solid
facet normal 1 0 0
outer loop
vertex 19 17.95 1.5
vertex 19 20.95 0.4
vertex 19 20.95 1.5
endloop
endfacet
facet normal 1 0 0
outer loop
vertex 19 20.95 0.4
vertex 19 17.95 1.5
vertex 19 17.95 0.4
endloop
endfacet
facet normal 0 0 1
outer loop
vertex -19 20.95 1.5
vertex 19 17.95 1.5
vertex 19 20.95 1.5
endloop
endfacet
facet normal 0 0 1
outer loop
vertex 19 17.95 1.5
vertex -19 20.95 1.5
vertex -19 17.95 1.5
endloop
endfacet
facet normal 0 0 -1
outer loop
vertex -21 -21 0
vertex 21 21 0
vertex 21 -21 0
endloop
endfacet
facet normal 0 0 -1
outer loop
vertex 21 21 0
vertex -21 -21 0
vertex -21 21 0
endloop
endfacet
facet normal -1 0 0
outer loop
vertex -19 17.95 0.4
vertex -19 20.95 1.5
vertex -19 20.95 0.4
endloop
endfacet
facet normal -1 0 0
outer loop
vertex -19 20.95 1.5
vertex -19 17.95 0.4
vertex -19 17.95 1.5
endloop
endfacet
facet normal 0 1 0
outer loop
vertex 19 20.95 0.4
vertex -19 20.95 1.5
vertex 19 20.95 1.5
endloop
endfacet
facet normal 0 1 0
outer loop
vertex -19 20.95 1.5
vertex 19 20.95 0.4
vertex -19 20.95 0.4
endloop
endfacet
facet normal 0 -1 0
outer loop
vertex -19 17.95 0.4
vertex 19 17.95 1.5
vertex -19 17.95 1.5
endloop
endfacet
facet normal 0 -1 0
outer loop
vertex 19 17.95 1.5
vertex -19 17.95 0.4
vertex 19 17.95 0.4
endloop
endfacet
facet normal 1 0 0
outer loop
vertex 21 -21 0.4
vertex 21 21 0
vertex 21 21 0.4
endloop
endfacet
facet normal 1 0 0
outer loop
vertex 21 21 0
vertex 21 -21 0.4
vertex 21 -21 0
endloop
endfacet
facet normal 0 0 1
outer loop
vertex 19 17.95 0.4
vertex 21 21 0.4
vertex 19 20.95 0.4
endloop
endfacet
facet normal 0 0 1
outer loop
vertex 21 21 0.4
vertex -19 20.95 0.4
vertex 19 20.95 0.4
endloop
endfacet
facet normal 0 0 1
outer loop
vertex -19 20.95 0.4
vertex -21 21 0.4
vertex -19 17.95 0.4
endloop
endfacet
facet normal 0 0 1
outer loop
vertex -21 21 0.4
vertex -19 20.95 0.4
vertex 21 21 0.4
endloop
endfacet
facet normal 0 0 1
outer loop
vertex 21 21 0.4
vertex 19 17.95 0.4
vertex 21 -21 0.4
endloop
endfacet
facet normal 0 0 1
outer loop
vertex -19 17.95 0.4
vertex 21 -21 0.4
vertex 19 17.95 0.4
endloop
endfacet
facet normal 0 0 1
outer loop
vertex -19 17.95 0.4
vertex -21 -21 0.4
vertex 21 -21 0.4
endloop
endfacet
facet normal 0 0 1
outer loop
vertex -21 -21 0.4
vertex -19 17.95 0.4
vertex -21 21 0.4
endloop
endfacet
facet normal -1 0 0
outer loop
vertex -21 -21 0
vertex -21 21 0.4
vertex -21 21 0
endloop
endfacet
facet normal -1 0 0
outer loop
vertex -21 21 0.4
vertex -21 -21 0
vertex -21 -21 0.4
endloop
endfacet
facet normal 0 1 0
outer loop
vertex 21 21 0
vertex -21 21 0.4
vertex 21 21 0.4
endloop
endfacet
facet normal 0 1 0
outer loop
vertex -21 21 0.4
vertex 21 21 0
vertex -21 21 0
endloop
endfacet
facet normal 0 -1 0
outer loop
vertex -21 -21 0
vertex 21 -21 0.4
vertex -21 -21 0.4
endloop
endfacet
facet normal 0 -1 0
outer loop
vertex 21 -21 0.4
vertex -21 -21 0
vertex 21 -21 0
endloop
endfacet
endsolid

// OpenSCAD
// Variablen (von Python via -D übergeben)
image_file = ""; 
text_id = ""; 

// Konstanten
inlay_size = 42.0;
max_height = 1.5;       
base_th = 0.4; // Massive Basisplatte

// WICHTIG: Das Relief muss minimal kleiner sein als die 42mm Bodenplatte!
// Wir nehmen 41.8mm. Teilen sich beide Objekte die exakt selbe Außenwand,
// erzeugt OpenSCAD kaputte Geometrien, die der Slicer als "flache Platte" flickt.
scale_xy = 41.8 / 150;   

union() {
    // 1. Die echte Bodenplatte (garantiert zu 100% eine solide, löcherfreie Basis!)
    translate([-inlay_size/2, -inlay_size/2, 0])
    cube([inlay_size, inlay_size, base_th]);

    // 2. Das Relief (sitzt auf der Bodenplatte)
    // Wir starten bei Z=0.39 (0.01mm tief in der Bodenplatte versenkt, um perfekt zu verschmelzen)
    // Dadurch gibt es keinen Sandwich-Bug mehr im Slicer!
    translate([0, 0, base_th - 0.01])
    scale([scale_xy, scale_xy, (max_height - base_th + 0.01) / 100])
    translate([-75, -75, 0])
    surface(file = image_file, center = false, invert = true);

    // 3. User-ID Steg oben (startet ebenfalls massiv bei Z=0)
    translate([0, inlay_size/2 - 1.55, 0]) {
        difference() {
            translate([0, 0, max_height / 2])
            cube([inlay_size - 4, 3, max_height], center = true);

            // Textgravur (0.4mm tief von der Oberkante)
            translate([0, 0, max_height - 0.4])
            linear_extrude(height = 1.1) {
                text(text_id, size=2.5, halign="center", valign="center");
            }
        }
    }
}
